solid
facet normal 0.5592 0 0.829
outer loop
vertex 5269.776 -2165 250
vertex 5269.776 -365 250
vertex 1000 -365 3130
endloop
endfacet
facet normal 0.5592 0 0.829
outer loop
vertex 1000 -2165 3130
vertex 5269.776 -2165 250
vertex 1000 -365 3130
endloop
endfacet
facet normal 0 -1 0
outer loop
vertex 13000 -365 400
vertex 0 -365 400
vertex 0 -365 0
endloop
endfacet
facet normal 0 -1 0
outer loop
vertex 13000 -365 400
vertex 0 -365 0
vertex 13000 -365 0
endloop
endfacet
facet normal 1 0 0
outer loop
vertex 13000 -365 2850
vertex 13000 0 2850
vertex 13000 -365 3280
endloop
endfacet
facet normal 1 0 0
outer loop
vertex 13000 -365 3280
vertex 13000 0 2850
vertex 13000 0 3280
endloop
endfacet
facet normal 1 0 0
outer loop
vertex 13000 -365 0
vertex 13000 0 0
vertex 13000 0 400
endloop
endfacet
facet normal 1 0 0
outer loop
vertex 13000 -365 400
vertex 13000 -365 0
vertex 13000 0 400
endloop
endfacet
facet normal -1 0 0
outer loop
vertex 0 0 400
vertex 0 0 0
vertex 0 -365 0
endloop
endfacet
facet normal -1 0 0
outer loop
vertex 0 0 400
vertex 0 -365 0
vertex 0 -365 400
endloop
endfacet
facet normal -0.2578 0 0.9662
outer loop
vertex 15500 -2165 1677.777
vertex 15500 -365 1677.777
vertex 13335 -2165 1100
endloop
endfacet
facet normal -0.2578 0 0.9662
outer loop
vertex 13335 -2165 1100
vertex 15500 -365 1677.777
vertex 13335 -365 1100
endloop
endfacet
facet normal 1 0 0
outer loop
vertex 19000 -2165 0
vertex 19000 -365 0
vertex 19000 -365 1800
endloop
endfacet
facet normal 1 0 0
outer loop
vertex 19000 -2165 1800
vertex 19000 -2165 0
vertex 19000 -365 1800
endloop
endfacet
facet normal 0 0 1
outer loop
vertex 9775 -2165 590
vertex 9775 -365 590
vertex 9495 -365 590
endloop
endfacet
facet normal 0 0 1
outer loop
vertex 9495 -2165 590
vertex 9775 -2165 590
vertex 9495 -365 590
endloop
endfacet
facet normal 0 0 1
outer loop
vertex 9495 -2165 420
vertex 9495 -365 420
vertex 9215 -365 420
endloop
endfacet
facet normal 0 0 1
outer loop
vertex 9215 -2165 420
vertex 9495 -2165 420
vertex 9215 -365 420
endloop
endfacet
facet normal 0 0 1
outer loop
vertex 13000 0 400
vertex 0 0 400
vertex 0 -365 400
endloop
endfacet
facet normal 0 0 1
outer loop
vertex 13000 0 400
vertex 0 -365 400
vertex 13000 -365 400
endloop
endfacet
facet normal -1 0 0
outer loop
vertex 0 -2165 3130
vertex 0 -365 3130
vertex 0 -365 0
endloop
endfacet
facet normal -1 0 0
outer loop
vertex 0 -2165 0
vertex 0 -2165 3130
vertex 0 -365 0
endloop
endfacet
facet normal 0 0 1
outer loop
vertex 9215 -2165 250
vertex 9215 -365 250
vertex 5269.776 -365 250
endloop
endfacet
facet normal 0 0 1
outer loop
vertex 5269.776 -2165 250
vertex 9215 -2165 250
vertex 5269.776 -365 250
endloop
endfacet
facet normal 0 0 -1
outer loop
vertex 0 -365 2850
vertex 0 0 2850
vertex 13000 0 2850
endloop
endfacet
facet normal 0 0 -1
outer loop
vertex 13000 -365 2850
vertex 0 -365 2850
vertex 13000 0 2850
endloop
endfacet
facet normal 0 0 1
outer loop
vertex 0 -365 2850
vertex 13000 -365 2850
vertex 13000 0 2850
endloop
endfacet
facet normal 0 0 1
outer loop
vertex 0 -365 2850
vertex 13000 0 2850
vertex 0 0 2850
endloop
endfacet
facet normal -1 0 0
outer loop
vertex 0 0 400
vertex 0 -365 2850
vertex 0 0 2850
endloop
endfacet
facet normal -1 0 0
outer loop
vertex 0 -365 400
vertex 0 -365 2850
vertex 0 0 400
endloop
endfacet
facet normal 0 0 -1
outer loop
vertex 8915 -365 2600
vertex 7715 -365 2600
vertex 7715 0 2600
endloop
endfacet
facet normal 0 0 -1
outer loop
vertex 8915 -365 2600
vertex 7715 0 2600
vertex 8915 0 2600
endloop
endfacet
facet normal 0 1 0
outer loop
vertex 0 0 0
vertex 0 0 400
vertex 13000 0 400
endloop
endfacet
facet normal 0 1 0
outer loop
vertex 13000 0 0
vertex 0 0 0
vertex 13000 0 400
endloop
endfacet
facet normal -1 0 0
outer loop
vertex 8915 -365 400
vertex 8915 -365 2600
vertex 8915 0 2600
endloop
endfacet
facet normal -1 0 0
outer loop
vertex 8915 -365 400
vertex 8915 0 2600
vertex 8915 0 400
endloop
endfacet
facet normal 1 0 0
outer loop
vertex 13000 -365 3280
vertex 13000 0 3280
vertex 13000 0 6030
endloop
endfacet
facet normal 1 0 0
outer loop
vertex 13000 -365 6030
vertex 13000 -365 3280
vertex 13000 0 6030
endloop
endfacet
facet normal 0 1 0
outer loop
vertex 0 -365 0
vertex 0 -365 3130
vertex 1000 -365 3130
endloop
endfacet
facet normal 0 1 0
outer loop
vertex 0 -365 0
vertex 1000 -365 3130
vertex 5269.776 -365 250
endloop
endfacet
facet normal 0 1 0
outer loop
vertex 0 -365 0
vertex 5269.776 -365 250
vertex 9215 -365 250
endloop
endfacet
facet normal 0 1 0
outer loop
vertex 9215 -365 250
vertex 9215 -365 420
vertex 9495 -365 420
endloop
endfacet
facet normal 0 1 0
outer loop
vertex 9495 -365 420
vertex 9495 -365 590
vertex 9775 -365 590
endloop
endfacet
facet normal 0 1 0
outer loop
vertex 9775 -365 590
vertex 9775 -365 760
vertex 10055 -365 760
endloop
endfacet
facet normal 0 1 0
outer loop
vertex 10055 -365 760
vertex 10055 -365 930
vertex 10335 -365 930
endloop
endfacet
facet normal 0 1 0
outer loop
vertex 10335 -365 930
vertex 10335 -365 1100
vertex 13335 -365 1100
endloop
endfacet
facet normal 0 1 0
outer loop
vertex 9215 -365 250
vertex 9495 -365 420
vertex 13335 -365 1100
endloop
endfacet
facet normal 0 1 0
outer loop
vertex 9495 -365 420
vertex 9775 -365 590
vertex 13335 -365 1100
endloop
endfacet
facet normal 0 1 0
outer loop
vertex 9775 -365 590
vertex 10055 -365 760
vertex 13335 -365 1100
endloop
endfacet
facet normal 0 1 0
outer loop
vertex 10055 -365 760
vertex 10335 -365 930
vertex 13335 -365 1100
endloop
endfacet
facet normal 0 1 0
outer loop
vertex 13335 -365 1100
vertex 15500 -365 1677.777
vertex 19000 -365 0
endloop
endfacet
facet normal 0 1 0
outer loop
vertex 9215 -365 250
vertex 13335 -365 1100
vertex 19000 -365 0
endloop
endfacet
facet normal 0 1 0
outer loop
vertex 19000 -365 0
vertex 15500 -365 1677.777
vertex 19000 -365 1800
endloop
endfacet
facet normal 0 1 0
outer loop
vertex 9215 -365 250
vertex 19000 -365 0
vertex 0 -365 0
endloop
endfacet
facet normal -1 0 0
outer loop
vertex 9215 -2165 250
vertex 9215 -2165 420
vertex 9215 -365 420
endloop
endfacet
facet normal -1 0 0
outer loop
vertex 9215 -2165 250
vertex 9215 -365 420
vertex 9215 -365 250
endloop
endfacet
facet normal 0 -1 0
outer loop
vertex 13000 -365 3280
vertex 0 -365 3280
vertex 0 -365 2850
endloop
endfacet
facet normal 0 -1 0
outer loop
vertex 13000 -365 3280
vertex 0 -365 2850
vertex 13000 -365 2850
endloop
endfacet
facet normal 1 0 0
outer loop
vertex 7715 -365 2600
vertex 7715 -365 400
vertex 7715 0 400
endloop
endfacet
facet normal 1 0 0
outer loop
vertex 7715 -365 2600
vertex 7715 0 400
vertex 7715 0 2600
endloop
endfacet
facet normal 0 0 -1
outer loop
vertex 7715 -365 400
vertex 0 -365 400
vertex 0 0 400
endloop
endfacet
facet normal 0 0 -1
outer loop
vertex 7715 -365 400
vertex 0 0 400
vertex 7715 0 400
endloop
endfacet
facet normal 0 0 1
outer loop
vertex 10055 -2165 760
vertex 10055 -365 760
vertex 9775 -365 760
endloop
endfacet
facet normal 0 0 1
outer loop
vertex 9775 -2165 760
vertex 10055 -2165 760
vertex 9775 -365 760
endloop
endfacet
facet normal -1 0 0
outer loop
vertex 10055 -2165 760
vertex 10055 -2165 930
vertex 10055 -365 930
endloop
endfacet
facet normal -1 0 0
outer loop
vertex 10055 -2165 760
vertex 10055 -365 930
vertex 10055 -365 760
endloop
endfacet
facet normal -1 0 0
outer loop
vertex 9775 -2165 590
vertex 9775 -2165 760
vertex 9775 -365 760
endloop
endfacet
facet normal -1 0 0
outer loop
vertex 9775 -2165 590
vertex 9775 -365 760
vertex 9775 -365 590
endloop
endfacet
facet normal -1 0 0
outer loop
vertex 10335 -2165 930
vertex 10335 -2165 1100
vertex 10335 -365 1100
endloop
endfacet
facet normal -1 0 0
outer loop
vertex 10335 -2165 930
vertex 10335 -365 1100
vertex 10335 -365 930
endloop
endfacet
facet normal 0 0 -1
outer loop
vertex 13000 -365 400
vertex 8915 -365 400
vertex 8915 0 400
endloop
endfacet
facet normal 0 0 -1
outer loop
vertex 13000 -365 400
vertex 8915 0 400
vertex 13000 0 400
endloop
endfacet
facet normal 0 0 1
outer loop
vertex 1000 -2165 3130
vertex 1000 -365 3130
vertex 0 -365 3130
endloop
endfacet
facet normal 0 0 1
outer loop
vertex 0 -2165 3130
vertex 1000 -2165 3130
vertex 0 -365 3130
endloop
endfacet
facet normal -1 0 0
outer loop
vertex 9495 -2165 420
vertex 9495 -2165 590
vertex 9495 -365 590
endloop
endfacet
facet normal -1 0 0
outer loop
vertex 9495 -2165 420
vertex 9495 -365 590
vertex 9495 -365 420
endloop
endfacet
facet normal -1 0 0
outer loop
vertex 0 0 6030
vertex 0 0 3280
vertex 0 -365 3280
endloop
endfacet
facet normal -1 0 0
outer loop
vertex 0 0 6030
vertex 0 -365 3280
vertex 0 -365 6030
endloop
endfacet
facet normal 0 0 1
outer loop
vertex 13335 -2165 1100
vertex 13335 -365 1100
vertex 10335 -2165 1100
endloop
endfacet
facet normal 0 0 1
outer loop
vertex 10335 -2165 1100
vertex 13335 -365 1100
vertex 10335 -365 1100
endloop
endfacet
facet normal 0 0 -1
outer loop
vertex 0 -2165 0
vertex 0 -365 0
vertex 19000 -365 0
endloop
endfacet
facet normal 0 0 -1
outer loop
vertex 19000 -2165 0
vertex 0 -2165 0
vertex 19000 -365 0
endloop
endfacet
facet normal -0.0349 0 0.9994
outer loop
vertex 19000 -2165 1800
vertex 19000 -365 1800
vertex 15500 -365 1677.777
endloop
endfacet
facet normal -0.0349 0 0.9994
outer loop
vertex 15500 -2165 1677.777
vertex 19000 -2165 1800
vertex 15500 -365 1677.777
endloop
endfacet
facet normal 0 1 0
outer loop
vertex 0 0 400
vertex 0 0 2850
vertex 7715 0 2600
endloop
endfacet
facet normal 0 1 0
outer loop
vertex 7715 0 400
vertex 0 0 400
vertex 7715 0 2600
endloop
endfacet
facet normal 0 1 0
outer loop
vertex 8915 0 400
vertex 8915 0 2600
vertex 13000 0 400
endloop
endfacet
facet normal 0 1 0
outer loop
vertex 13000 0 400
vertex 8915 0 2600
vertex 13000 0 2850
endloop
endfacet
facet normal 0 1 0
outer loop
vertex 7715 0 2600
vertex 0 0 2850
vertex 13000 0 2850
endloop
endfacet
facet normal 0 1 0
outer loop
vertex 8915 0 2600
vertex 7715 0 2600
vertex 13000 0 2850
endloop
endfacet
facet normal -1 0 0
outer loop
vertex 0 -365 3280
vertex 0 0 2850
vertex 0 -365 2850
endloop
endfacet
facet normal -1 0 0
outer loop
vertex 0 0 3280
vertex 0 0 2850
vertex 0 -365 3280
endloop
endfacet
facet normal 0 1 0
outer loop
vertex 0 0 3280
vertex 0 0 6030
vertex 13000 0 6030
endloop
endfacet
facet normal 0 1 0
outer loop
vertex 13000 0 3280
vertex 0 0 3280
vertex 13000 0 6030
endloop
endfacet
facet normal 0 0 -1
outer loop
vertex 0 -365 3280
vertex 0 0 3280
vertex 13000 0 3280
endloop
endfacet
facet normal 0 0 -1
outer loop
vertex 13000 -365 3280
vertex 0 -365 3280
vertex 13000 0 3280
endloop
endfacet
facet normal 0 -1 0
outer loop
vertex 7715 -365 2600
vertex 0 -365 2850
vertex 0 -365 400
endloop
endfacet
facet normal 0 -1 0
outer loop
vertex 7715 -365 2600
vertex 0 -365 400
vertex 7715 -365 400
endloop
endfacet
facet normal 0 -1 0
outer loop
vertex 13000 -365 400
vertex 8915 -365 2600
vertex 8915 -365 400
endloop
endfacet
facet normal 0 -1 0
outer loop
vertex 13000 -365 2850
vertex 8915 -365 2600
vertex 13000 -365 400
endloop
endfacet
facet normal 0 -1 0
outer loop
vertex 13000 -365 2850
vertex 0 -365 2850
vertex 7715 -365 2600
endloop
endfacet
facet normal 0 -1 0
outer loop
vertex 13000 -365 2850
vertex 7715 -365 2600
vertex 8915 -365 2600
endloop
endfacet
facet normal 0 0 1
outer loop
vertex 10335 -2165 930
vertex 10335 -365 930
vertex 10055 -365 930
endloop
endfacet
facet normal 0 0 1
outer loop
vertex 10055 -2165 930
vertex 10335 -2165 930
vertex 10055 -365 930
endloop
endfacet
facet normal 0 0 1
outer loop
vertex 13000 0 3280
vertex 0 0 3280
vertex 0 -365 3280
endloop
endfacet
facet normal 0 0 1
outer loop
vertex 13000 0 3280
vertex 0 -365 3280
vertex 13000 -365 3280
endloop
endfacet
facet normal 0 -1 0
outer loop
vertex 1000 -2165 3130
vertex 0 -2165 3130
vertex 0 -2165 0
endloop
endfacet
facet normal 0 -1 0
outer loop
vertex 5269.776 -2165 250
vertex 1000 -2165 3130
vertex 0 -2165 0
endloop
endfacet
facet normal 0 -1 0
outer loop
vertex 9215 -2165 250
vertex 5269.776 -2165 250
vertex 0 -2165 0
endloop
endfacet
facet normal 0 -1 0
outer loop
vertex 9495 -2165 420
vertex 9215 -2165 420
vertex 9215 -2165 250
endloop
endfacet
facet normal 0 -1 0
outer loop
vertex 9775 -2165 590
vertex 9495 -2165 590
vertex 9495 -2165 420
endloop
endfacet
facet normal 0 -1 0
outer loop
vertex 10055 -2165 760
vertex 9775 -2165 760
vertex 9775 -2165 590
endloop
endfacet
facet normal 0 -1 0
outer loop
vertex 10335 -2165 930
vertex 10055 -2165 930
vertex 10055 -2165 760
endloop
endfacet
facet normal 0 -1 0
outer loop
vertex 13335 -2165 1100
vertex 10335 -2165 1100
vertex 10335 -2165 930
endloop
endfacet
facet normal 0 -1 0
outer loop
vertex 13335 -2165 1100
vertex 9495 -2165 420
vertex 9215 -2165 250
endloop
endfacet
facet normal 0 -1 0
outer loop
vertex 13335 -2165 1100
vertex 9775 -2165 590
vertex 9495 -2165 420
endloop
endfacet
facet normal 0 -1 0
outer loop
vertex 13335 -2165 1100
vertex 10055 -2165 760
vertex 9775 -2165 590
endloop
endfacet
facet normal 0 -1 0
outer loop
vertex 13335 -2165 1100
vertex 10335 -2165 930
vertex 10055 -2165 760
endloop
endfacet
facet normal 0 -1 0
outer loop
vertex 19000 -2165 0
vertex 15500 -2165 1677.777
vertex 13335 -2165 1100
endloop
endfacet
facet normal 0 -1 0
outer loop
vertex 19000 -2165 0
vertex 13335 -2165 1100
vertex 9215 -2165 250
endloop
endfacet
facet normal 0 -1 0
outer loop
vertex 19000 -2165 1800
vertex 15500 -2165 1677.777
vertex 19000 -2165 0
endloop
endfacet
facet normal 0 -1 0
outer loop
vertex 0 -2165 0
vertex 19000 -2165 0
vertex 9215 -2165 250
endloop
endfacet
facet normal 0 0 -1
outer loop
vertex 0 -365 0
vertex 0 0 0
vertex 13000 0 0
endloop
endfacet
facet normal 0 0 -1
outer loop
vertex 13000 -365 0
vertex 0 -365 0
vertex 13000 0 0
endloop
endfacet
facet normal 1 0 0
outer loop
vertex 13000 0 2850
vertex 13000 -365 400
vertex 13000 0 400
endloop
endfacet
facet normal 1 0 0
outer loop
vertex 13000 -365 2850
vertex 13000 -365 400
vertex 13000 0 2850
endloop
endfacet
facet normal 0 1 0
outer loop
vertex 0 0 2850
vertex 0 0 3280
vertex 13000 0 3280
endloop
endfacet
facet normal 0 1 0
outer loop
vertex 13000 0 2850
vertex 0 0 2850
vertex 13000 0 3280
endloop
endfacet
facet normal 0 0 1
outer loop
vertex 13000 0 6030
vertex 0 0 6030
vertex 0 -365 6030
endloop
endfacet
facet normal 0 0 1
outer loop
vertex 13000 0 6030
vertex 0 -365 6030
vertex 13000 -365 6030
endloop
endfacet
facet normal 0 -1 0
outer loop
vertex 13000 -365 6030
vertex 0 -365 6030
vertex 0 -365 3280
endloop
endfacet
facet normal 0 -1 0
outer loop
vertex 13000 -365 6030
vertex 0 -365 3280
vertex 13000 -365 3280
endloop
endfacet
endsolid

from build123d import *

# Parameters (mm, degrees)
F0_W      = 13000
F0_H      = 400
F1_DEPTH  = 365
F3_DEPTH  = 365
F4_W      = 13000
F4_H      = 430
F5_DEPTH  = 365
F6_W      = 13000
F6_H      = 2750
F7_DEPTH  = 365
F10_DEPTH = 1800


with BuildPart() as f1:
    # F0 (on Front) → F1 (new body)
    with BuildSketch(Plane.XZ):
        with Locations((6500, 200)):
            Rectangle(F0_W, F0_H)
    extrude(amount=F1_DEPTH)


with BuildPart() as f3:
    # F2 (on face) → F3 (new body)
    with BuildSketch(Plane.XZ.offset(365)):
        Polygon((0, 2850), (0, 400), (7715, 400), (7715, 2600), (8915, 2600), (8915, 400), (13000, 400), (13000, 2850), align=None)
    extrude(amount=-F3_DEPTH)


with BuildPart() as f5:
    # F4 (on Front) → F5 (new body)
    with BuildSketch(Plane.XZ):
        with Locations((6500, 3065)):
            Rectangle(F4_W, F4_H)
    extrude(amount=F5_DEPTH)


with BuildPart() as f7:
    # F6 (on Front) → F7 (new body)
    with BuildSketch(Plane.XZ):
        with Locations((6500, 4655)):
            Rectangle(F6_W, F6_H)
    extrude(amount=F7_DEPTH)


with BuildPart() as f10:
    # F9 (on face) → F10 (new body)
    with BuildSketch(Plane.XZ.offset(365)):
        Polygon((1000, 3130), (0, 3130), (0, 0), (19000, 0), (19000, 1800), (15500, 1677.777307), (13335, 1100), (10335, 1100), (10335, 930), (10055, 930), (10055, 760), (9775, 760), (9775, 590), (9495, 590), (9495, 420), (9215, 420), (9215, 250), (5269.775589, 250), align=None)
    extrude(amount=F10_DEPTH)


solid = Compound([f1.part, f3.part, f5.part, f7.part, f10.part])
